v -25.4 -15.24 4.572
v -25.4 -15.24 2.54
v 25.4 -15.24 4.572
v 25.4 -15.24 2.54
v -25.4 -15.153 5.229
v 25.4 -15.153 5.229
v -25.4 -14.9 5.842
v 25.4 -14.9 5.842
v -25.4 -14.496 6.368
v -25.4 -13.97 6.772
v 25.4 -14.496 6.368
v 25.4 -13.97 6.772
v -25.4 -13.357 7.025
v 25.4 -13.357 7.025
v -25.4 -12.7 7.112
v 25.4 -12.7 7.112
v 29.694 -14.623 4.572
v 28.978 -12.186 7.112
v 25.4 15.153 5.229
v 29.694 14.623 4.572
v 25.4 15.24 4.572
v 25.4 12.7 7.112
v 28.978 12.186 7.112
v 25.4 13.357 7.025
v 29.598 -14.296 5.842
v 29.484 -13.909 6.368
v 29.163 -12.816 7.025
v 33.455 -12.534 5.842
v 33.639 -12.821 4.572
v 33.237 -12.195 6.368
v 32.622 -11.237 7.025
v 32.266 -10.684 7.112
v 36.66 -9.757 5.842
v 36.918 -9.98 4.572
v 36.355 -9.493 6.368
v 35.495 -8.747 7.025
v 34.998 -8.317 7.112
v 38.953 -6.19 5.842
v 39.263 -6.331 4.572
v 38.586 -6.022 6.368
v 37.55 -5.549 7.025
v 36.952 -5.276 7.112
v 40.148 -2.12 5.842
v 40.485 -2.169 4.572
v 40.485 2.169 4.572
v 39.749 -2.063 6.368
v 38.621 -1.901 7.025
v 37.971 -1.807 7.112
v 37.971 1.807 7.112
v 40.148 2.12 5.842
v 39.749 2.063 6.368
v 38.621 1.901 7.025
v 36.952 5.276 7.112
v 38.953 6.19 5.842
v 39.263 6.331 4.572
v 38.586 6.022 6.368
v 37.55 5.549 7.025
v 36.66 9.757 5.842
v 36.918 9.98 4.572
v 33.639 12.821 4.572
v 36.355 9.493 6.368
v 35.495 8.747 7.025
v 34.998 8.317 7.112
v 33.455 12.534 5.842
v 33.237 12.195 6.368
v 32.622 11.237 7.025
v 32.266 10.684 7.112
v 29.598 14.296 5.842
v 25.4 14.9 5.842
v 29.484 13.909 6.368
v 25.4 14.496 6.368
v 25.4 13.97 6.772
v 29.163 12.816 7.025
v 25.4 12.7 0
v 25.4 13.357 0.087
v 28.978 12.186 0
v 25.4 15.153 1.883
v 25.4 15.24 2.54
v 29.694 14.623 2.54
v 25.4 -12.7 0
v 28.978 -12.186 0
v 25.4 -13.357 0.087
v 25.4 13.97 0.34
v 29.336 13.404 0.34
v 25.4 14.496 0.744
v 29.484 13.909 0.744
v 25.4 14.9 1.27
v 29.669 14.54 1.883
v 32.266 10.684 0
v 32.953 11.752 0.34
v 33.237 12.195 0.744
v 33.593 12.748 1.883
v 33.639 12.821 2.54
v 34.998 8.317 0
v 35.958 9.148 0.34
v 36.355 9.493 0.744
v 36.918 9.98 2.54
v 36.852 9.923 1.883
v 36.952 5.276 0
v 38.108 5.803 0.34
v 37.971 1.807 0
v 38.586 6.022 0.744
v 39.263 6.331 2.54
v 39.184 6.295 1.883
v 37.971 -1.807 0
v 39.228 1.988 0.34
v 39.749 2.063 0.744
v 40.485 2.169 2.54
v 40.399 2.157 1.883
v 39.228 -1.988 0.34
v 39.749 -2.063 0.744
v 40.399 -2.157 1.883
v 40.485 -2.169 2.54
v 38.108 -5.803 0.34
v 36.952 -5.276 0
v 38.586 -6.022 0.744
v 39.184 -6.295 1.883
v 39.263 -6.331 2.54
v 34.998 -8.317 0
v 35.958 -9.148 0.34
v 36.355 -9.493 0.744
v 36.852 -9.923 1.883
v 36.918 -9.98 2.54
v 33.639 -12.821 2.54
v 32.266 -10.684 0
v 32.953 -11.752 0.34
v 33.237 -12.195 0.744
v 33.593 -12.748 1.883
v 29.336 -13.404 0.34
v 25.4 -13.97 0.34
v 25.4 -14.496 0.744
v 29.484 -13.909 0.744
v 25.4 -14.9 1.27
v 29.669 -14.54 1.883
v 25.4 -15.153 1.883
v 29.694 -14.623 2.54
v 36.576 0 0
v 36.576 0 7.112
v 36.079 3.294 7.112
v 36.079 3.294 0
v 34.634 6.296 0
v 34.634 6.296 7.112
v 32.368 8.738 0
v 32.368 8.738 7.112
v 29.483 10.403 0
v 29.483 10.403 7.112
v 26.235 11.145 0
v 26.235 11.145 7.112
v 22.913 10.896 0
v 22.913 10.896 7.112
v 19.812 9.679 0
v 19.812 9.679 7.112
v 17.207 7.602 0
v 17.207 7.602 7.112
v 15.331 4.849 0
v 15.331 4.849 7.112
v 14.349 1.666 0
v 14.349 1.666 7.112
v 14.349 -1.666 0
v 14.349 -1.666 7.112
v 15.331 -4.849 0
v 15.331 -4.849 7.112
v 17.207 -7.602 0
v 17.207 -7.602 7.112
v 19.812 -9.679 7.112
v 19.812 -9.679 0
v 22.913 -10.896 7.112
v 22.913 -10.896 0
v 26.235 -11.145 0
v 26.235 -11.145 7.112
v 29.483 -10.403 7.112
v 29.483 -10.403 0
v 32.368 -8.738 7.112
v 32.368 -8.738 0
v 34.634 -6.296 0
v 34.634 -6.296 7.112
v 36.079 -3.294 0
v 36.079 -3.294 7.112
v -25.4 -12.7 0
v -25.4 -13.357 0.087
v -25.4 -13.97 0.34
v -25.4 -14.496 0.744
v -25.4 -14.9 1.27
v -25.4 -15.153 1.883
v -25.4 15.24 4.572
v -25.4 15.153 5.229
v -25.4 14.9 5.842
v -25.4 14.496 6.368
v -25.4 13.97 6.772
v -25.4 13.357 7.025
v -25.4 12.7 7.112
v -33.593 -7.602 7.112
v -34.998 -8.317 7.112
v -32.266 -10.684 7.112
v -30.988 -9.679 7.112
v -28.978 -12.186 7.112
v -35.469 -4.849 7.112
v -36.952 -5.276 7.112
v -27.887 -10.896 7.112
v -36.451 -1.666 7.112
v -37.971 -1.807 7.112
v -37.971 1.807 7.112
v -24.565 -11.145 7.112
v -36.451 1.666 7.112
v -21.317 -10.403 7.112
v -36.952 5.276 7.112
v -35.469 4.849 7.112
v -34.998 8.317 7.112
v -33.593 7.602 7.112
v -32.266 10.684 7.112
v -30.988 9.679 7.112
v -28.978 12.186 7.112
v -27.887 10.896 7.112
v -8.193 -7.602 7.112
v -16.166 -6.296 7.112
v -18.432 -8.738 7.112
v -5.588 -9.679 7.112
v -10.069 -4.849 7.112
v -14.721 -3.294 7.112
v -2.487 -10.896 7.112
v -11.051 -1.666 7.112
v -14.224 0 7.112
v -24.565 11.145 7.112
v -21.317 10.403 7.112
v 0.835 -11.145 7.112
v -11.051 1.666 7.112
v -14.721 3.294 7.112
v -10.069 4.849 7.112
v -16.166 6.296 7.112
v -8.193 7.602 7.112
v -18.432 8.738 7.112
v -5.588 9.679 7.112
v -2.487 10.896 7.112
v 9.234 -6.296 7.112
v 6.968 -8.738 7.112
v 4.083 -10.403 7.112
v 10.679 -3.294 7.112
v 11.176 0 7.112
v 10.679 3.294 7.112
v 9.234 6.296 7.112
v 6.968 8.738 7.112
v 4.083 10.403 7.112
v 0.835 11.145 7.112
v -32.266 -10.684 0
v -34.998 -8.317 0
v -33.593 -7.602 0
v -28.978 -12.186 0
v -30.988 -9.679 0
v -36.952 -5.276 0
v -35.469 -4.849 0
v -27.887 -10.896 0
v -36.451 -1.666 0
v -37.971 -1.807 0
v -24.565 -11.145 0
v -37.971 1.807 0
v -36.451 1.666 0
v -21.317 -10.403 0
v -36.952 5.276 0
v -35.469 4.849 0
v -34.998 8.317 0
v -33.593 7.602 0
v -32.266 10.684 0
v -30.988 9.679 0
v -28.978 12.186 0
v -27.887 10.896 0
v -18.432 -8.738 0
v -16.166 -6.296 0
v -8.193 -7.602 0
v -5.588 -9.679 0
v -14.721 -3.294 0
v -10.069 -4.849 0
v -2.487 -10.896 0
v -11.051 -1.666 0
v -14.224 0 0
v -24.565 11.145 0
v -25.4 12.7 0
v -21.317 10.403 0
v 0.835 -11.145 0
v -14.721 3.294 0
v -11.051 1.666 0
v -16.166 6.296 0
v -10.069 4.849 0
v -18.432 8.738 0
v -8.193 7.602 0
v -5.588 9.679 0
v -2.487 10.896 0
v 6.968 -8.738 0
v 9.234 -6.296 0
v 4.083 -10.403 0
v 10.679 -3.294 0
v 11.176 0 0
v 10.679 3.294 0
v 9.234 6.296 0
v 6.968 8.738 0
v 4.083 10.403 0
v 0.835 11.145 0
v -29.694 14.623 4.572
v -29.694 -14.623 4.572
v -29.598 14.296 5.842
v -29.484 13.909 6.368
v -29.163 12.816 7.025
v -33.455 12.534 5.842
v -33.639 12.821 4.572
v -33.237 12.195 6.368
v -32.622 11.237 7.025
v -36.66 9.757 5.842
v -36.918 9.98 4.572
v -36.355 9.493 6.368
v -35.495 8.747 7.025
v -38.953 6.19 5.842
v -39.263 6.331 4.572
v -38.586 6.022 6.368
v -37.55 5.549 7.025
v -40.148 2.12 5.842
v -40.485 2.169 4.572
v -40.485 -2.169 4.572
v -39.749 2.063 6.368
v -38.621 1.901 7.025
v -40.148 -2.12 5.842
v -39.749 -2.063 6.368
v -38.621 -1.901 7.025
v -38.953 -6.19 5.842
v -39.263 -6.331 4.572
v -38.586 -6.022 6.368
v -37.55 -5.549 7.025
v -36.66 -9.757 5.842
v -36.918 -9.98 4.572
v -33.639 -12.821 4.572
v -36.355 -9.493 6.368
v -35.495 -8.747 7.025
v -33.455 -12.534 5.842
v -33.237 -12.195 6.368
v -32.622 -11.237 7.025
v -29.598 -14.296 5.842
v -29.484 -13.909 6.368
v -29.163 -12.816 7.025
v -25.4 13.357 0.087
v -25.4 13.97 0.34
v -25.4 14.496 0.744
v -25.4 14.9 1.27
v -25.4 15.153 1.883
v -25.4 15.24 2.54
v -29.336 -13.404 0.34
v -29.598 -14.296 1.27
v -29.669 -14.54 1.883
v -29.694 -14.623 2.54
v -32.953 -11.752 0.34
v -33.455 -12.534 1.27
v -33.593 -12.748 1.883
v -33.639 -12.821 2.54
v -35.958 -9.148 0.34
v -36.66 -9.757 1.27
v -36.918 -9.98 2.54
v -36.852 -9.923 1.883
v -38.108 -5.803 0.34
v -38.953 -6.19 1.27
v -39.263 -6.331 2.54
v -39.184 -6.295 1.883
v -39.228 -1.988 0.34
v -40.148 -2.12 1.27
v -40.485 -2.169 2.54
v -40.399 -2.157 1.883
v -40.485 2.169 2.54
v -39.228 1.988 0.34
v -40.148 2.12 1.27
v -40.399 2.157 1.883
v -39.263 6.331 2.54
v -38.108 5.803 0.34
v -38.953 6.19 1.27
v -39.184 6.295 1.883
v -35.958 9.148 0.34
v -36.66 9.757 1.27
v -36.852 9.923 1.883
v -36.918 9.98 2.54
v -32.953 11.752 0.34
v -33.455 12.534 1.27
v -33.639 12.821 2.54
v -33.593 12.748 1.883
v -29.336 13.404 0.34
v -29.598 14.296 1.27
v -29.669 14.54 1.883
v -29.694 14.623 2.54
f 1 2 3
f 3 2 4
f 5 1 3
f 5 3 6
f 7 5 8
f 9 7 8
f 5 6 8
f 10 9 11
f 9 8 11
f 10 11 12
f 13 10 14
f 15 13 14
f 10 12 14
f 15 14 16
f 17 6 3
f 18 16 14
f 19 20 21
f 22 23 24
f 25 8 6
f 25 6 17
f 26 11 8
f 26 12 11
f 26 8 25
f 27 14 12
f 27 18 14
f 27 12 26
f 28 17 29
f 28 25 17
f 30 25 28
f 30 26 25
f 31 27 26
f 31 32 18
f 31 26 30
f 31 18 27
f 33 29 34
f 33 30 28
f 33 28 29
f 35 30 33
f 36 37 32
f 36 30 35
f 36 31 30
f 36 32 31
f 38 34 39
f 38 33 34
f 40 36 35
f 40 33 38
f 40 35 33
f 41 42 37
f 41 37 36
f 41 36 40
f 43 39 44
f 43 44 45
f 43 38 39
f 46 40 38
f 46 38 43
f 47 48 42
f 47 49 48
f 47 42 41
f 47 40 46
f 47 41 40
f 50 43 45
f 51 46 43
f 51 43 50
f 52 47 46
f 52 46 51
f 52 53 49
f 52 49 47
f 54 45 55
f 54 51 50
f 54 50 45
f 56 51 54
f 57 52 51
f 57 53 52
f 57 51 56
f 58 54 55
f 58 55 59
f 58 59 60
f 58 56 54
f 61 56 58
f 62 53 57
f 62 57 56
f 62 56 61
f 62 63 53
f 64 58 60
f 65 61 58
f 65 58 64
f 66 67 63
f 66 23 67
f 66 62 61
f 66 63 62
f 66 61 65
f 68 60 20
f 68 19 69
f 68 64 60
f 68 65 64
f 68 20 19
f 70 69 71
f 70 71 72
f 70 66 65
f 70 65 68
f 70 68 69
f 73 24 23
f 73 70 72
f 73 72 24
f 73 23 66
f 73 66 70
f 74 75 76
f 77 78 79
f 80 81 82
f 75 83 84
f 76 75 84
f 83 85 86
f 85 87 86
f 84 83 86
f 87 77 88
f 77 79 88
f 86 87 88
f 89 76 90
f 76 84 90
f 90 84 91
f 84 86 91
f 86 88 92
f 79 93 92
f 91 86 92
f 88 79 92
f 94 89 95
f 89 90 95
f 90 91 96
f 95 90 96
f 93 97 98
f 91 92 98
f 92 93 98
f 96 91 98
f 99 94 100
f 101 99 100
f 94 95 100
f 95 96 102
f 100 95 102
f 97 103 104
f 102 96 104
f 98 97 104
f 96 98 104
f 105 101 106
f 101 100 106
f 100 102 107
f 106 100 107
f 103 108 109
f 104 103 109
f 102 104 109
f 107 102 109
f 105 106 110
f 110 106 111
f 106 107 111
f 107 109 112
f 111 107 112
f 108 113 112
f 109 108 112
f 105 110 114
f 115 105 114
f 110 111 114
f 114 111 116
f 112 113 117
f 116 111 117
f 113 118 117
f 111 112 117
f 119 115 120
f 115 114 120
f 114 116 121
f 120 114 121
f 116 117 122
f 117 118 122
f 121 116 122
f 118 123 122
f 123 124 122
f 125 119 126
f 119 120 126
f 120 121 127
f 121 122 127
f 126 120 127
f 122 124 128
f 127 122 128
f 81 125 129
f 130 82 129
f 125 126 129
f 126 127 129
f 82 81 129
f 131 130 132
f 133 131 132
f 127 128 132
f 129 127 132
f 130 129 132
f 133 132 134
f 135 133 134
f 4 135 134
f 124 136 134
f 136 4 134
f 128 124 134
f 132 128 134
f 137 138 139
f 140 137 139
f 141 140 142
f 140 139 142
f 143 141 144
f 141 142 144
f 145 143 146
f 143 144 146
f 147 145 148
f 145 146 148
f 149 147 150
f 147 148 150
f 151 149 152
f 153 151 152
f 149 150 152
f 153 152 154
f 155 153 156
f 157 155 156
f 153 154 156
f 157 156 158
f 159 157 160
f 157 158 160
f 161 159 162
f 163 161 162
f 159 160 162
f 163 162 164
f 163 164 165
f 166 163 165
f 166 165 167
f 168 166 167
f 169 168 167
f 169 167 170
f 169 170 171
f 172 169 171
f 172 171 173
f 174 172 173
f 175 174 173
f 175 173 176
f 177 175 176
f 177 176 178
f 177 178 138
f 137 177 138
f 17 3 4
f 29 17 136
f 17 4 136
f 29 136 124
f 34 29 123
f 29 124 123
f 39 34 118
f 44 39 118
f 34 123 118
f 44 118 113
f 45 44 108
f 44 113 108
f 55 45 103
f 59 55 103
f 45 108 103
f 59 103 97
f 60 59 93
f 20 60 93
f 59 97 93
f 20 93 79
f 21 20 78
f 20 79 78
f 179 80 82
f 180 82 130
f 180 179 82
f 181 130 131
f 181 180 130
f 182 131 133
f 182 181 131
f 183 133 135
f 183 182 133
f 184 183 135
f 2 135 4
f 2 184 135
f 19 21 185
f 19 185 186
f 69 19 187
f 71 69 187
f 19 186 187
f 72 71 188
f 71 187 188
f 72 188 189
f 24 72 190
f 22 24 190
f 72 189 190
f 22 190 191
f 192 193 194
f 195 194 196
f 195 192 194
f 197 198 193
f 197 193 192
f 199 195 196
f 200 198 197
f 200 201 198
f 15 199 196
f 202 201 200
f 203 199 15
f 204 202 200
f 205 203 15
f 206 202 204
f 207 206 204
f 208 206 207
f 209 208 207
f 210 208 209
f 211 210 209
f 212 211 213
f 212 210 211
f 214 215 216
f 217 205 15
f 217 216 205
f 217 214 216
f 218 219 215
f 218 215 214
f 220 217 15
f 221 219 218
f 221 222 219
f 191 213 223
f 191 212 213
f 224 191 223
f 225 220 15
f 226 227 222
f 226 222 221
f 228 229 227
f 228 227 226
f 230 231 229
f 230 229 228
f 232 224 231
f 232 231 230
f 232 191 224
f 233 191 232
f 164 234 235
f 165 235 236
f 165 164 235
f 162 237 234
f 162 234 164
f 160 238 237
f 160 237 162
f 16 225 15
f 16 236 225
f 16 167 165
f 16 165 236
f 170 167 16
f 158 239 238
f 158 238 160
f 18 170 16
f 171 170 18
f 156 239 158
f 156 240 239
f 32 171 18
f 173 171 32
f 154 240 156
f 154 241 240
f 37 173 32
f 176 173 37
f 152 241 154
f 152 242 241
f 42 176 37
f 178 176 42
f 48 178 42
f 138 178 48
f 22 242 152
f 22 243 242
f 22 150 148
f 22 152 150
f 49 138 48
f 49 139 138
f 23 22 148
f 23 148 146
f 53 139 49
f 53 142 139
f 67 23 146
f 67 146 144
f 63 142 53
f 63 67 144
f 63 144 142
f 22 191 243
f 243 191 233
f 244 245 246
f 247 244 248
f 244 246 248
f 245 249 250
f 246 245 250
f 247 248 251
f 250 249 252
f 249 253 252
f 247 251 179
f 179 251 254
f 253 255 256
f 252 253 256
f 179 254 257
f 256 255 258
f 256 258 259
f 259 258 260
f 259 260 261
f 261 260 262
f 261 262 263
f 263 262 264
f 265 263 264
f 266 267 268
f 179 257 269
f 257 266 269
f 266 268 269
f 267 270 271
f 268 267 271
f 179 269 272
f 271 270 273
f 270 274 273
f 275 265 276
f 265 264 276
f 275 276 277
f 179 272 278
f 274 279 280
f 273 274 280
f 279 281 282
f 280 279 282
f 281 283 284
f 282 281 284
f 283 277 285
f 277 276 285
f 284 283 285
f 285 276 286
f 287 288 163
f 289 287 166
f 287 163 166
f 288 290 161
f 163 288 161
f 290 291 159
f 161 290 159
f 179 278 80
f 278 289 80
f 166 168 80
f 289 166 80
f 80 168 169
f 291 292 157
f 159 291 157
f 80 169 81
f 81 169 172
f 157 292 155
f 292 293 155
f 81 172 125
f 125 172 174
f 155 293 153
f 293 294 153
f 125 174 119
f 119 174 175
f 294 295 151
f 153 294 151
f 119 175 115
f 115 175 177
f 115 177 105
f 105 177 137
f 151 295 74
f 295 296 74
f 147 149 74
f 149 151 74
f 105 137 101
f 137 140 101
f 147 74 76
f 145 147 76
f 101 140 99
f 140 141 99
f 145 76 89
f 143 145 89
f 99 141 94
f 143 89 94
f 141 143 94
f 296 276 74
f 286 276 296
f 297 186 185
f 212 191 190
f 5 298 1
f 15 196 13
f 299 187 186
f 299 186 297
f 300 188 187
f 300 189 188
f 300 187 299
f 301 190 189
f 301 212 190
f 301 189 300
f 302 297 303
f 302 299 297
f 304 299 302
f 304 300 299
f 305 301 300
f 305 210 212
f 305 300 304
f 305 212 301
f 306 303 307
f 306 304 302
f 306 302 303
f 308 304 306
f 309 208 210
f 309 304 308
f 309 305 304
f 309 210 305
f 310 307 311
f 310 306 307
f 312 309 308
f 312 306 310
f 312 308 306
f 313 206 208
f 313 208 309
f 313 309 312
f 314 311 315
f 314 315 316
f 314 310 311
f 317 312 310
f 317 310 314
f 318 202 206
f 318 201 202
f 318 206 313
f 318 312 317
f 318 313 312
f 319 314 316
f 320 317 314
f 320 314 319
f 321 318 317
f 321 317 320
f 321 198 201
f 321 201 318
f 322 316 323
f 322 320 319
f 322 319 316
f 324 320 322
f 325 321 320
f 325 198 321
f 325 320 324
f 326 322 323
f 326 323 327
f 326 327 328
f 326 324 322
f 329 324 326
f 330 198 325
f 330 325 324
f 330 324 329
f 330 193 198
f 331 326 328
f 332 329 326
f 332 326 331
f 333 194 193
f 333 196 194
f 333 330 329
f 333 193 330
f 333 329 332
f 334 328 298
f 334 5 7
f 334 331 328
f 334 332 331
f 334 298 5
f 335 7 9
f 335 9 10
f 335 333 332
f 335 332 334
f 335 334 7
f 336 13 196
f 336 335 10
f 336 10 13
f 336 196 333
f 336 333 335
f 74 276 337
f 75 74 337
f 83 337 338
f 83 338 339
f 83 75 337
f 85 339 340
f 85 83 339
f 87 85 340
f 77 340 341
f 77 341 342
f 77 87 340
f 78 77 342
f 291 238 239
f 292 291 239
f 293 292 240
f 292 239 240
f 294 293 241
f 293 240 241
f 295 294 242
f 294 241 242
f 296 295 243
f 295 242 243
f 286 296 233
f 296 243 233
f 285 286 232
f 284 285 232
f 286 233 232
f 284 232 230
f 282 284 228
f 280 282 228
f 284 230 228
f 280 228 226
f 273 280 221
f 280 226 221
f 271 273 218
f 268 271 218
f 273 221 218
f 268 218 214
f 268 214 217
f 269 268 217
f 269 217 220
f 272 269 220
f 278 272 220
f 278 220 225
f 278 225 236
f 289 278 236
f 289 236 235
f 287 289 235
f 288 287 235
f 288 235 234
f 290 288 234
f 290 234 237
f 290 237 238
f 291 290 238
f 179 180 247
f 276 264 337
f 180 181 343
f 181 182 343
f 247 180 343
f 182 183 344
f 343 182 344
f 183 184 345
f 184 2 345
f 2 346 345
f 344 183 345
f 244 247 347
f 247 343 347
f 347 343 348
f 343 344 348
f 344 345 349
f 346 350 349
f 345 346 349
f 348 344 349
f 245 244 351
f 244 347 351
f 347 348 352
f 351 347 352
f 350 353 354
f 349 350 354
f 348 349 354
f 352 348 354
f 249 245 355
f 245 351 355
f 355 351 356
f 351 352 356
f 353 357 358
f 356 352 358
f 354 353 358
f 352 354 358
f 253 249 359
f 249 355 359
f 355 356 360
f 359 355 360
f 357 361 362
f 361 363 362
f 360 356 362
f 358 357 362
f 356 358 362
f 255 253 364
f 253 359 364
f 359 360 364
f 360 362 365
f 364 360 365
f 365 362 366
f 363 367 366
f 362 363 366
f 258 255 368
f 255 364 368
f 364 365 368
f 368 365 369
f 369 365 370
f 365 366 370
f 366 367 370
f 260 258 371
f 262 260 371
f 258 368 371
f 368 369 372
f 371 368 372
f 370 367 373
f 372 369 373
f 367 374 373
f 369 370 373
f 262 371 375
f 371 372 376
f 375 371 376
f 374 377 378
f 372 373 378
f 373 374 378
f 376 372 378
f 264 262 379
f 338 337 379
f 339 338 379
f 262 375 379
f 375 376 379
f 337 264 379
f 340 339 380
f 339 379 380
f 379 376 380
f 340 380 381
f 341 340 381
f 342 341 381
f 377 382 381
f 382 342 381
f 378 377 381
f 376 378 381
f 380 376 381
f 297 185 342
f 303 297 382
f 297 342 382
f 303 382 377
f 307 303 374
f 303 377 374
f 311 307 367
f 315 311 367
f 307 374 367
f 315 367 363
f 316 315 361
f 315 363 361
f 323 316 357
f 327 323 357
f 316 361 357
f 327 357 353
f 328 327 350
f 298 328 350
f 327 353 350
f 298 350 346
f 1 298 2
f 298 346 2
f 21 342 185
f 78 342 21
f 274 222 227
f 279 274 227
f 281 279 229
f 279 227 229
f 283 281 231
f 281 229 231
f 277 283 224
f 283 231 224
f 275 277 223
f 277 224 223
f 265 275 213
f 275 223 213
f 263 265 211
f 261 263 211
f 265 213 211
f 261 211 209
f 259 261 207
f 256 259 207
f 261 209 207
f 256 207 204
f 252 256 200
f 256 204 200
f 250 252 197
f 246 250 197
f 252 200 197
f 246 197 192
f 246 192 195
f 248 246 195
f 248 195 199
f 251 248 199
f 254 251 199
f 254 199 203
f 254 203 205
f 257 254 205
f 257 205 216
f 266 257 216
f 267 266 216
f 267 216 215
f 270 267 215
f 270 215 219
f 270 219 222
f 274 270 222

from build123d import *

# Parameters (mm, degrees)
F0_W     = 50.8
F0_H     = 30.48
F1_DEPTH = 7.112
F2_R     = 11.176
F3_DEPTH = 25.4
F4_R     = 2.54


with BuildPart() as f1:
    # F0 (on Top) → F1 (new body)
    with BuildSketch(Plane.XY):
        Rectangle(F0_W, F0_H)
        with BuildLine():
            ThreePointArc((25.4, -15.24), (40.64, 0), (25.4, 15.24))
            Line((25.4, 15.24), (25.4, -15.24))
        make_face()
        with BuildLine():
            Line((-25.4, -15.24), (-25.4, 15.24))
            ThreePointArc((-25.4, 15.24), (-40.64, 0), (-25.4, -15.24))
        make_face()
    extrude(amount=F1_DEPTH)

    # F2 (on face) → F3 (cut)
    with BuildSketch(Plane.XY.offset(7.112)):
        Circle(F2_R)
        with Locations((-25.4, 0)):
            Circle(F2_R)
        with Locations((25.4, 0)):
            Circle(F2_R)
    extrude(amount=-F3_DEPTH, mode=Mode.SUBTRACT)

    # F4
    f4_edges = [f1.edges().sort_by_distance(p)[0] for p in [
        (0, 15.24, 0),
        (-40.64, 0, 0),
        (0, -15.24, 0),
        (40.64, 0, 0),
        (40.64, 0, 7.112),
        (0, 15.24, 7.112),
        (-40.64, 0, 7.112),
        (0, -15.24, 7.112),
    ]]
    fillet(f4_edges, radius=F4_R)


solid = f1.part
